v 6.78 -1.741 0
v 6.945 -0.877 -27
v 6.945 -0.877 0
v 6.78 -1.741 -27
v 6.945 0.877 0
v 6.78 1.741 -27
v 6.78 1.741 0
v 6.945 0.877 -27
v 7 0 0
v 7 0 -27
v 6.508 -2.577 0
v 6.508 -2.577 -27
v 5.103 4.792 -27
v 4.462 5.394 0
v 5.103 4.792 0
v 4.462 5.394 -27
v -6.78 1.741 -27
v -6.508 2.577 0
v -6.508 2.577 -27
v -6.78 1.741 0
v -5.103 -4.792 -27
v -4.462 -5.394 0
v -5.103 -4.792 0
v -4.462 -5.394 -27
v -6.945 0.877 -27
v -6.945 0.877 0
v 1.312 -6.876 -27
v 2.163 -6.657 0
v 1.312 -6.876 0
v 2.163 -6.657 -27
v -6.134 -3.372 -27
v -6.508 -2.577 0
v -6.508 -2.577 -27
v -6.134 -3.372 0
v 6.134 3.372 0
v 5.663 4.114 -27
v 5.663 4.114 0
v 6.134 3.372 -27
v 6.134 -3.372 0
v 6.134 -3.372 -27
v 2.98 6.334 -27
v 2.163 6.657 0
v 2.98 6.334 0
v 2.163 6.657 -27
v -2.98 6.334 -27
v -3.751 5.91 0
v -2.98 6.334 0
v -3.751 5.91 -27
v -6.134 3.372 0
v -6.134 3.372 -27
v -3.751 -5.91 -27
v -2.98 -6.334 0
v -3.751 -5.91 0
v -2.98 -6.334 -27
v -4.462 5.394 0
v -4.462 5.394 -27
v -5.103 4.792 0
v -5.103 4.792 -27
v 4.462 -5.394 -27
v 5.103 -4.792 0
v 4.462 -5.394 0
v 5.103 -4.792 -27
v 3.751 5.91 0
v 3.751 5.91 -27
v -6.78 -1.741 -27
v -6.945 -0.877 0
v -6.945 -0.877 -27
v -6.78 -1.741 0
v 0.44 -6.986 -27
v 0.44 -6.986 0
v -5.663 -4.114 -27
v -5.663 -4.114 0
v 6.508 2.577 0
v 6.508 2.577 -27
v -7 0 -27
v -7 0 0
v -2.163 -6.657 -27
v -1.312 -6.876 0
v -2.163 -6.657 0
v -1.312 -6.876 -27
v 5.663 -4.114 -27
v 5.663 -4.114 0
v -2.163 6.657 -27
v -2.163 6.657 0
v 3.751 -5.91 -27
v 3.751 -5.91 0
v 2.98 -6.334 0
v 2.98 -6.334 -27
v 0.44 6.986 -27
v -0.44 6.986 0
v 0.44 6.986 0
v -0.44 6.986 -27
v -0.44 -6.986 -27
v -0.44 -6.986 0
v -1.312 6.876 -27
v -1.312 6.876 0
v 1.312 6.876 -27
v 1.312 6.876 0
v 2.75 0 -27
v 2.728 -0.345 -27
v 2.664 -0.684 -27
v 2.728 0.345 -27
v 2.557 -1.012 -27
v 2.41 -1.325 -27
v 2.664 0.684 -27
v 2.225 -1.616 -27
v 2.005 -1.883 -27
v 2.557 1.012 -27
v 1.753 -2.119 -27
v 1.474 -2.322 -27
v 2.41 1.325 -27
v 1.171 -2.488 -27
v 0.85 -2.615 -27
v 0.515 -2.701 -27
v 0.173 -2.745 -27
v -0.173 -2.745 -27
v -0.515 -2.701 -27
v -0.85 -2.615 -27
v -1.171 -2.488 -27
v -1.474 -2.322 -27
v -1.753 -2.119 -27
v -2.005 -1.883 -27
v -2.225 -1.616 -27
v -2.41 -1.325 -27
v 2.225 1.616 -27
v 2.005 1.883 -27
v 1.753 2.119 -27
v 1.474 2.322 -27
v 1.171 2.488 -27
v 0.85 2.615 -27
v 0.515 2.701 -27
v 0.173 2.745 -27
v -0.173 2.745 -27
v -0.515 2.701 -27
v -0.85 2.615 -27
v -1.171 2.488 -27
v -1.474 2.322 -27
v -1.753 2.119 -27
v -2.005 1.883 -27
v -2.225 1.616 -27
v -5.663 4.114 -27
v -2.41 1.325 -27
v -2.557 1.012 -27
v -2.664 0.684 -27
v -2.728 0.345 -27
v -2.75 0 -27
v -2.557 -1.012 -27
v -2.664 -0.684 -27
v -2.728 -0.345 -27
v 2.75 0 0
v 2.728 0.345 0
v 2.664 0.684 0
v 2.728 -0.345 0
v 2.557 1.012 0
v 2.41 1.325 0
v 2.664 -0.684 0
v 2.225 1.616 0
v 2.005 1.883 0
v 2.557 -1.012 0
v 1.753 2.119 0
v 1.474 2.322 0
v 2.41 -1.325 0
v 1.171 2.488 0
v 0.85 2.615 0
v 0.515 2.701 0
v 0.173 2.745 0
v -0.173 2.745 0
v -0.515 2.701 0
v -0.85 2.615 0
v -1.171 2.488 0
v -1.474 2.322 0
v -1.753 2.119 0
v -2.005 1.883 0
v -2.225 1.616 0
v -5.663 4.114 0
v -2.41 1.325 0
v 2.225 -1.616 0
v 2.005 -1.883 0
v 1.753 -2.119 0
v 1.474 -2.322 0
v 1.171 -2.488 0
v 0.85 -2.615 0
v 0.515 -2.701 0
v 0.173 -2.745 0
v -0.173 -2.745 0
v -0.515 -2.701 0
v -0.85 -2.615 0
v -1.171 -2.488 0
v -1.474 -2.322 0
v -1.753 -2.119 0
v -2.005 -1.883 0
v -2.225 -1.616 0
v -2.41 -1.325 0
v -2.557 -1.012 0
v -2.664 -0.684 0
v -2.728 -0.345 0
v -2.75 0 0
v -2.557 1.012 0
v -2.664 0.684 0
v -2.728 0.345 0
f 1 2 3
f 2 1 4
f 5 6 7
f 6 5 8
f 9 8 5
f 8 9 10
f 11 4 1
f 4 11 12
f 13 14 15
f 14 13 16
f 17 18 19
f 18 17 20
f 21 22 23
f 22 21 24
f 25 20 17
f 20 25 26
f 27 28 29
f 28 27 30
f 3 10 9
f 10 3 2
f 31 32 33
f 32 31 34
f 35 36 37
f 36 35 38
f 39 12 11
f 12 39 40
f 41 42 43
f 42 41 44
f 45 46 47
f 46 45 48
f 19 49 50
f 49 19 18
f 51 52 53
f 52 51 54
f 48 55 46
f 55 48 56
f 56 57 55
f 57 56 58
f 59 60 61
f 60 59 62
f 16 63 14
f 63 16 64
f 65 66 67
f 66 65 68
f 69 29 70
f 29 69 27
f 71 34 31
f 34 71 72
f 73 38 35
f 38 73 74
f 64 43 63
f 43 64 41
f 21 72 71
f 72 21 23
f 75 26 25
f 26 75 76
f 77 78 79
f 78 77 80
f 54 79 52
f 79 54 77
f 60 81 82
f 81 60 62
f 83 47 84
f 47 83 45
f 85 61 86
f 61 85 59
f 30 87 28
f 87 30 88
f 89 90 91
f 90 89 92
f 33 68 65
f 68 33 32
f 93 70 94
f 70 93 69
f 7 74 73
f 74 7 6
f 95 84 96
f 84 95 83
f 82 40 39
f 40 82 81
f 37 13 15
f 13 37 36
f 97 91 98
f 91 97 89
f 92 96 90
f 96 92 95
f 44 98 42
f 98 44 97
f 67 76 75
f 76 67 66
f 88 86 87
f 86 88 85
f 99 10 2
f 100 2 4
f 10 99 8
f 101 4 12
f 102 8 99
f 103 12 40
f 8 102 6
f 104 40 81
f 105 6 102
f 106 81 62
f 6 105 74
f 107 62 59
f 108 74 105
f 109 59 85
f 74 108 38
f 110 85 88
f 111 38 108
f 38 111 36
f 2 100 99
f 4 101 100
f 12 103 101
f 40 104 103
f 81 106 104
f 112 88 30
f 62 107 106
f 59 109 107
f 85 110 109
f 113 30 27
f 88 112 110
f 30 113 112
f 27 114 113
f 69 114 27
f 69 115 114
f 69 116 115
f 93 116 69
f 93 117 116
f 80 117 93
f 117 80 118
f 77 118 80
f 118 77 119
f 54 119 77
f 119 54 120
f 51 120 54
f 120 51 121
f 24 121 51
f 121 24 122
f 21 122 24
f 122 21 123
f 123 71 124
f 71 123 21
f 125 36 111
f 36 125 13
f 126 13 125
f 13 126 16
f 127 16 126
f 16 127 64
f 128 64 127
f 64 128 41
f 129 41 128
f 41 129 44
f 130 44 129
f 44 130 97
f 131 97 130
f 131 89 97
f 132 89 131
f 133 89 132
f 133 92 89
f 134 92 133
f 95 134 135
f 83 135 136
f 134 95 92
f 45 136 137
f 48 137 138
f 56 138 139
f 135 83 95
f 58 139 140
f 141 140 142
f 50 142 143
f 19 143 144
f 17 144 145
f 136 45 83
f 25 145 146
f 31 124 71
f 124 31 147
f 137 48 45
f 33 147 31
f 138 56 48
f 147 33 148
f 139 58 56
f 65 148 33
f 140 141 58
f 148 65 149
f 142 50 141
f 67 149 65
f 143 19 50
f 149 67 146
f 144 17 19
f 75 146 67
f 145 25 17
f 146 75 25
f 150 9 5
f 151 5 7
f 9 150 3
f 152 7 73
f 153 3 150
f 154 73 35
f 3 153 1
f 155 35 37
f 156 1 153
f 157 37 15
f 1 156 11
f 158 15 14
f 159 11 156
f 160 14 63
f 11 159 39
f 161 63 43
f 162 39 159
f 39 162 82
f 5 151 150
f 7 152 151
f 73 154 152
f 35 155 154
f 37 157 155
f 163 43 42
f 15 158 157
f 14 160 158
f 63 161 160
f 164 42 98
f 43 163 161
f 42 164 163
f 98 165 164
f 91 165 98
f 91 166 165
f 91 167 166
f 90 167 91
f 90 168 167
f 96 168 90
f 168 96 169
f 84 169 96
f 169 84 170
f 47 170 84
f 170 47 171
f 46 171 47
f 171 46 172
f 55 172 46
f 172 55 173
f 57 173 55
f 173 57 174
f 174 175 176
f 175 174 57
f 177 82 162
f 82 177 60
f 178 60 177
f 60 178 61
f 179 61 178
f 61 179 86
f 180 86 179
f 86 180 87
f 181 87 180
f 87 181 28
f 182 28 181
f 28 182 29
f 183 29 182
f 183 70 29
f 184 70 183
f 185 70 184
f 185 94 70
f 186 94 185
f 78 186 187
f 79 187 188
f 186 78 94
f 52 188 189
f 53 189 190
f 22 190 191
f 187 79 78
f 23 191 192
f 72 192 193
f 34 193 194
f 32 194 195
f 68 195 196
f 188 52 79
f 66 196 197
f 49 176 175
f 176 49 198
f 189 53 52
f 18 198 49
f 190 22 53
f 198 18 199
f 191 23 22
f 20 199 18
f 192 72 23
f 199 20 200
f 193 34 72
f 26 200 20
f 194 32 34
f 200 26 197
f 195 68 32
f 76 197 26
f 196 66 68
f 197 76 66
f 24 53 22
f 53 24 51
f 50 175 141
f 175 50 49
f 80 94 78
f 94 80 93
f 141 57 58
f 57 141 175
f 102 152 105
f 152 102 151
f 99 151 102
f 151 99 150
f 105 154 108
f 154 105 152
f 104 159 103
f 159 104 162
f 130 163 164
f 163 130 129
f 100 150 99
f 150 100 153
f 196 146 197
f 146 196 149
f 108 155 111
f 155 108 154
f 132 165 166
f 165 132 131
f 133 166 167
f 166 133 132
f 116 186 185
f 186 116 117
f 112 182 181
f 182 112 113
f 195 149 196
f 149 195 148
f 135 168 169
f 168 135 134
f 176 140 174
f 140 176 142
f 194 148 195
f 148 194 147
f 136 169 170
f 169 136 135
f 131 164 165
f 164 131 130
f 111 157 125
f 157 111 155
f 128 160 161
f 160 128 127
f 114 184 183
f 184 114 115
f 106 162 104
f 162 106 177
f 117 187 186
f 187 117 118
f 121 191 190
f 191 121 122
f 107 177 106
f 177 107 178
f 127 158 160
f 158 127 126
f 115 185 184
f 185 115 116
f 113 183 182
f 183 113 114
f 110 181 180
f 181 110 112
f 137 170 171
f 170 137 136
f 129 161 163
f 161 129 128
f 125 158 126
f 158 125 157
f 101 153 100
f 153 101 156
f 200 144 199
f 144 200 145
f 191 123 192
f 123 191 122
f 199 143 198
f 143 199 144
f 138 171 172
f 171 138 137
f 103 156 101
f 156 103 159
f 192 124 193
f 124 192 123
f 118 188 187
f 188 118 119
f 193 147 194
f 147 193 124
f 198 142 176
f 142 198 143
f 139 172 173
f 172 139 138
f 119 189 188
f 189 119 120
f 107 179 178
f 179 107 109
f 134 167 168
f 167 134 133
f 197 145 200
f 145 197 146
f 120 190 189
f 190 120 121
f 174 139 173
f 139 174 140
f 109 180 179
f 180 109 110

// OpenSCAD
$fn = 50;


difference() {
	union() {
		translate(v = [0, 0, -27.0000000000]) {
			cylinder(h = 27, r = 7.0000000000);
		}
		cylinder(h = 0, r = 13.0000000000);
	}
	union() {
		#translate(v = [0, 0, -27]) {
			cylinder(h = 27, r = 2.7500000000);
		}
	}
}
